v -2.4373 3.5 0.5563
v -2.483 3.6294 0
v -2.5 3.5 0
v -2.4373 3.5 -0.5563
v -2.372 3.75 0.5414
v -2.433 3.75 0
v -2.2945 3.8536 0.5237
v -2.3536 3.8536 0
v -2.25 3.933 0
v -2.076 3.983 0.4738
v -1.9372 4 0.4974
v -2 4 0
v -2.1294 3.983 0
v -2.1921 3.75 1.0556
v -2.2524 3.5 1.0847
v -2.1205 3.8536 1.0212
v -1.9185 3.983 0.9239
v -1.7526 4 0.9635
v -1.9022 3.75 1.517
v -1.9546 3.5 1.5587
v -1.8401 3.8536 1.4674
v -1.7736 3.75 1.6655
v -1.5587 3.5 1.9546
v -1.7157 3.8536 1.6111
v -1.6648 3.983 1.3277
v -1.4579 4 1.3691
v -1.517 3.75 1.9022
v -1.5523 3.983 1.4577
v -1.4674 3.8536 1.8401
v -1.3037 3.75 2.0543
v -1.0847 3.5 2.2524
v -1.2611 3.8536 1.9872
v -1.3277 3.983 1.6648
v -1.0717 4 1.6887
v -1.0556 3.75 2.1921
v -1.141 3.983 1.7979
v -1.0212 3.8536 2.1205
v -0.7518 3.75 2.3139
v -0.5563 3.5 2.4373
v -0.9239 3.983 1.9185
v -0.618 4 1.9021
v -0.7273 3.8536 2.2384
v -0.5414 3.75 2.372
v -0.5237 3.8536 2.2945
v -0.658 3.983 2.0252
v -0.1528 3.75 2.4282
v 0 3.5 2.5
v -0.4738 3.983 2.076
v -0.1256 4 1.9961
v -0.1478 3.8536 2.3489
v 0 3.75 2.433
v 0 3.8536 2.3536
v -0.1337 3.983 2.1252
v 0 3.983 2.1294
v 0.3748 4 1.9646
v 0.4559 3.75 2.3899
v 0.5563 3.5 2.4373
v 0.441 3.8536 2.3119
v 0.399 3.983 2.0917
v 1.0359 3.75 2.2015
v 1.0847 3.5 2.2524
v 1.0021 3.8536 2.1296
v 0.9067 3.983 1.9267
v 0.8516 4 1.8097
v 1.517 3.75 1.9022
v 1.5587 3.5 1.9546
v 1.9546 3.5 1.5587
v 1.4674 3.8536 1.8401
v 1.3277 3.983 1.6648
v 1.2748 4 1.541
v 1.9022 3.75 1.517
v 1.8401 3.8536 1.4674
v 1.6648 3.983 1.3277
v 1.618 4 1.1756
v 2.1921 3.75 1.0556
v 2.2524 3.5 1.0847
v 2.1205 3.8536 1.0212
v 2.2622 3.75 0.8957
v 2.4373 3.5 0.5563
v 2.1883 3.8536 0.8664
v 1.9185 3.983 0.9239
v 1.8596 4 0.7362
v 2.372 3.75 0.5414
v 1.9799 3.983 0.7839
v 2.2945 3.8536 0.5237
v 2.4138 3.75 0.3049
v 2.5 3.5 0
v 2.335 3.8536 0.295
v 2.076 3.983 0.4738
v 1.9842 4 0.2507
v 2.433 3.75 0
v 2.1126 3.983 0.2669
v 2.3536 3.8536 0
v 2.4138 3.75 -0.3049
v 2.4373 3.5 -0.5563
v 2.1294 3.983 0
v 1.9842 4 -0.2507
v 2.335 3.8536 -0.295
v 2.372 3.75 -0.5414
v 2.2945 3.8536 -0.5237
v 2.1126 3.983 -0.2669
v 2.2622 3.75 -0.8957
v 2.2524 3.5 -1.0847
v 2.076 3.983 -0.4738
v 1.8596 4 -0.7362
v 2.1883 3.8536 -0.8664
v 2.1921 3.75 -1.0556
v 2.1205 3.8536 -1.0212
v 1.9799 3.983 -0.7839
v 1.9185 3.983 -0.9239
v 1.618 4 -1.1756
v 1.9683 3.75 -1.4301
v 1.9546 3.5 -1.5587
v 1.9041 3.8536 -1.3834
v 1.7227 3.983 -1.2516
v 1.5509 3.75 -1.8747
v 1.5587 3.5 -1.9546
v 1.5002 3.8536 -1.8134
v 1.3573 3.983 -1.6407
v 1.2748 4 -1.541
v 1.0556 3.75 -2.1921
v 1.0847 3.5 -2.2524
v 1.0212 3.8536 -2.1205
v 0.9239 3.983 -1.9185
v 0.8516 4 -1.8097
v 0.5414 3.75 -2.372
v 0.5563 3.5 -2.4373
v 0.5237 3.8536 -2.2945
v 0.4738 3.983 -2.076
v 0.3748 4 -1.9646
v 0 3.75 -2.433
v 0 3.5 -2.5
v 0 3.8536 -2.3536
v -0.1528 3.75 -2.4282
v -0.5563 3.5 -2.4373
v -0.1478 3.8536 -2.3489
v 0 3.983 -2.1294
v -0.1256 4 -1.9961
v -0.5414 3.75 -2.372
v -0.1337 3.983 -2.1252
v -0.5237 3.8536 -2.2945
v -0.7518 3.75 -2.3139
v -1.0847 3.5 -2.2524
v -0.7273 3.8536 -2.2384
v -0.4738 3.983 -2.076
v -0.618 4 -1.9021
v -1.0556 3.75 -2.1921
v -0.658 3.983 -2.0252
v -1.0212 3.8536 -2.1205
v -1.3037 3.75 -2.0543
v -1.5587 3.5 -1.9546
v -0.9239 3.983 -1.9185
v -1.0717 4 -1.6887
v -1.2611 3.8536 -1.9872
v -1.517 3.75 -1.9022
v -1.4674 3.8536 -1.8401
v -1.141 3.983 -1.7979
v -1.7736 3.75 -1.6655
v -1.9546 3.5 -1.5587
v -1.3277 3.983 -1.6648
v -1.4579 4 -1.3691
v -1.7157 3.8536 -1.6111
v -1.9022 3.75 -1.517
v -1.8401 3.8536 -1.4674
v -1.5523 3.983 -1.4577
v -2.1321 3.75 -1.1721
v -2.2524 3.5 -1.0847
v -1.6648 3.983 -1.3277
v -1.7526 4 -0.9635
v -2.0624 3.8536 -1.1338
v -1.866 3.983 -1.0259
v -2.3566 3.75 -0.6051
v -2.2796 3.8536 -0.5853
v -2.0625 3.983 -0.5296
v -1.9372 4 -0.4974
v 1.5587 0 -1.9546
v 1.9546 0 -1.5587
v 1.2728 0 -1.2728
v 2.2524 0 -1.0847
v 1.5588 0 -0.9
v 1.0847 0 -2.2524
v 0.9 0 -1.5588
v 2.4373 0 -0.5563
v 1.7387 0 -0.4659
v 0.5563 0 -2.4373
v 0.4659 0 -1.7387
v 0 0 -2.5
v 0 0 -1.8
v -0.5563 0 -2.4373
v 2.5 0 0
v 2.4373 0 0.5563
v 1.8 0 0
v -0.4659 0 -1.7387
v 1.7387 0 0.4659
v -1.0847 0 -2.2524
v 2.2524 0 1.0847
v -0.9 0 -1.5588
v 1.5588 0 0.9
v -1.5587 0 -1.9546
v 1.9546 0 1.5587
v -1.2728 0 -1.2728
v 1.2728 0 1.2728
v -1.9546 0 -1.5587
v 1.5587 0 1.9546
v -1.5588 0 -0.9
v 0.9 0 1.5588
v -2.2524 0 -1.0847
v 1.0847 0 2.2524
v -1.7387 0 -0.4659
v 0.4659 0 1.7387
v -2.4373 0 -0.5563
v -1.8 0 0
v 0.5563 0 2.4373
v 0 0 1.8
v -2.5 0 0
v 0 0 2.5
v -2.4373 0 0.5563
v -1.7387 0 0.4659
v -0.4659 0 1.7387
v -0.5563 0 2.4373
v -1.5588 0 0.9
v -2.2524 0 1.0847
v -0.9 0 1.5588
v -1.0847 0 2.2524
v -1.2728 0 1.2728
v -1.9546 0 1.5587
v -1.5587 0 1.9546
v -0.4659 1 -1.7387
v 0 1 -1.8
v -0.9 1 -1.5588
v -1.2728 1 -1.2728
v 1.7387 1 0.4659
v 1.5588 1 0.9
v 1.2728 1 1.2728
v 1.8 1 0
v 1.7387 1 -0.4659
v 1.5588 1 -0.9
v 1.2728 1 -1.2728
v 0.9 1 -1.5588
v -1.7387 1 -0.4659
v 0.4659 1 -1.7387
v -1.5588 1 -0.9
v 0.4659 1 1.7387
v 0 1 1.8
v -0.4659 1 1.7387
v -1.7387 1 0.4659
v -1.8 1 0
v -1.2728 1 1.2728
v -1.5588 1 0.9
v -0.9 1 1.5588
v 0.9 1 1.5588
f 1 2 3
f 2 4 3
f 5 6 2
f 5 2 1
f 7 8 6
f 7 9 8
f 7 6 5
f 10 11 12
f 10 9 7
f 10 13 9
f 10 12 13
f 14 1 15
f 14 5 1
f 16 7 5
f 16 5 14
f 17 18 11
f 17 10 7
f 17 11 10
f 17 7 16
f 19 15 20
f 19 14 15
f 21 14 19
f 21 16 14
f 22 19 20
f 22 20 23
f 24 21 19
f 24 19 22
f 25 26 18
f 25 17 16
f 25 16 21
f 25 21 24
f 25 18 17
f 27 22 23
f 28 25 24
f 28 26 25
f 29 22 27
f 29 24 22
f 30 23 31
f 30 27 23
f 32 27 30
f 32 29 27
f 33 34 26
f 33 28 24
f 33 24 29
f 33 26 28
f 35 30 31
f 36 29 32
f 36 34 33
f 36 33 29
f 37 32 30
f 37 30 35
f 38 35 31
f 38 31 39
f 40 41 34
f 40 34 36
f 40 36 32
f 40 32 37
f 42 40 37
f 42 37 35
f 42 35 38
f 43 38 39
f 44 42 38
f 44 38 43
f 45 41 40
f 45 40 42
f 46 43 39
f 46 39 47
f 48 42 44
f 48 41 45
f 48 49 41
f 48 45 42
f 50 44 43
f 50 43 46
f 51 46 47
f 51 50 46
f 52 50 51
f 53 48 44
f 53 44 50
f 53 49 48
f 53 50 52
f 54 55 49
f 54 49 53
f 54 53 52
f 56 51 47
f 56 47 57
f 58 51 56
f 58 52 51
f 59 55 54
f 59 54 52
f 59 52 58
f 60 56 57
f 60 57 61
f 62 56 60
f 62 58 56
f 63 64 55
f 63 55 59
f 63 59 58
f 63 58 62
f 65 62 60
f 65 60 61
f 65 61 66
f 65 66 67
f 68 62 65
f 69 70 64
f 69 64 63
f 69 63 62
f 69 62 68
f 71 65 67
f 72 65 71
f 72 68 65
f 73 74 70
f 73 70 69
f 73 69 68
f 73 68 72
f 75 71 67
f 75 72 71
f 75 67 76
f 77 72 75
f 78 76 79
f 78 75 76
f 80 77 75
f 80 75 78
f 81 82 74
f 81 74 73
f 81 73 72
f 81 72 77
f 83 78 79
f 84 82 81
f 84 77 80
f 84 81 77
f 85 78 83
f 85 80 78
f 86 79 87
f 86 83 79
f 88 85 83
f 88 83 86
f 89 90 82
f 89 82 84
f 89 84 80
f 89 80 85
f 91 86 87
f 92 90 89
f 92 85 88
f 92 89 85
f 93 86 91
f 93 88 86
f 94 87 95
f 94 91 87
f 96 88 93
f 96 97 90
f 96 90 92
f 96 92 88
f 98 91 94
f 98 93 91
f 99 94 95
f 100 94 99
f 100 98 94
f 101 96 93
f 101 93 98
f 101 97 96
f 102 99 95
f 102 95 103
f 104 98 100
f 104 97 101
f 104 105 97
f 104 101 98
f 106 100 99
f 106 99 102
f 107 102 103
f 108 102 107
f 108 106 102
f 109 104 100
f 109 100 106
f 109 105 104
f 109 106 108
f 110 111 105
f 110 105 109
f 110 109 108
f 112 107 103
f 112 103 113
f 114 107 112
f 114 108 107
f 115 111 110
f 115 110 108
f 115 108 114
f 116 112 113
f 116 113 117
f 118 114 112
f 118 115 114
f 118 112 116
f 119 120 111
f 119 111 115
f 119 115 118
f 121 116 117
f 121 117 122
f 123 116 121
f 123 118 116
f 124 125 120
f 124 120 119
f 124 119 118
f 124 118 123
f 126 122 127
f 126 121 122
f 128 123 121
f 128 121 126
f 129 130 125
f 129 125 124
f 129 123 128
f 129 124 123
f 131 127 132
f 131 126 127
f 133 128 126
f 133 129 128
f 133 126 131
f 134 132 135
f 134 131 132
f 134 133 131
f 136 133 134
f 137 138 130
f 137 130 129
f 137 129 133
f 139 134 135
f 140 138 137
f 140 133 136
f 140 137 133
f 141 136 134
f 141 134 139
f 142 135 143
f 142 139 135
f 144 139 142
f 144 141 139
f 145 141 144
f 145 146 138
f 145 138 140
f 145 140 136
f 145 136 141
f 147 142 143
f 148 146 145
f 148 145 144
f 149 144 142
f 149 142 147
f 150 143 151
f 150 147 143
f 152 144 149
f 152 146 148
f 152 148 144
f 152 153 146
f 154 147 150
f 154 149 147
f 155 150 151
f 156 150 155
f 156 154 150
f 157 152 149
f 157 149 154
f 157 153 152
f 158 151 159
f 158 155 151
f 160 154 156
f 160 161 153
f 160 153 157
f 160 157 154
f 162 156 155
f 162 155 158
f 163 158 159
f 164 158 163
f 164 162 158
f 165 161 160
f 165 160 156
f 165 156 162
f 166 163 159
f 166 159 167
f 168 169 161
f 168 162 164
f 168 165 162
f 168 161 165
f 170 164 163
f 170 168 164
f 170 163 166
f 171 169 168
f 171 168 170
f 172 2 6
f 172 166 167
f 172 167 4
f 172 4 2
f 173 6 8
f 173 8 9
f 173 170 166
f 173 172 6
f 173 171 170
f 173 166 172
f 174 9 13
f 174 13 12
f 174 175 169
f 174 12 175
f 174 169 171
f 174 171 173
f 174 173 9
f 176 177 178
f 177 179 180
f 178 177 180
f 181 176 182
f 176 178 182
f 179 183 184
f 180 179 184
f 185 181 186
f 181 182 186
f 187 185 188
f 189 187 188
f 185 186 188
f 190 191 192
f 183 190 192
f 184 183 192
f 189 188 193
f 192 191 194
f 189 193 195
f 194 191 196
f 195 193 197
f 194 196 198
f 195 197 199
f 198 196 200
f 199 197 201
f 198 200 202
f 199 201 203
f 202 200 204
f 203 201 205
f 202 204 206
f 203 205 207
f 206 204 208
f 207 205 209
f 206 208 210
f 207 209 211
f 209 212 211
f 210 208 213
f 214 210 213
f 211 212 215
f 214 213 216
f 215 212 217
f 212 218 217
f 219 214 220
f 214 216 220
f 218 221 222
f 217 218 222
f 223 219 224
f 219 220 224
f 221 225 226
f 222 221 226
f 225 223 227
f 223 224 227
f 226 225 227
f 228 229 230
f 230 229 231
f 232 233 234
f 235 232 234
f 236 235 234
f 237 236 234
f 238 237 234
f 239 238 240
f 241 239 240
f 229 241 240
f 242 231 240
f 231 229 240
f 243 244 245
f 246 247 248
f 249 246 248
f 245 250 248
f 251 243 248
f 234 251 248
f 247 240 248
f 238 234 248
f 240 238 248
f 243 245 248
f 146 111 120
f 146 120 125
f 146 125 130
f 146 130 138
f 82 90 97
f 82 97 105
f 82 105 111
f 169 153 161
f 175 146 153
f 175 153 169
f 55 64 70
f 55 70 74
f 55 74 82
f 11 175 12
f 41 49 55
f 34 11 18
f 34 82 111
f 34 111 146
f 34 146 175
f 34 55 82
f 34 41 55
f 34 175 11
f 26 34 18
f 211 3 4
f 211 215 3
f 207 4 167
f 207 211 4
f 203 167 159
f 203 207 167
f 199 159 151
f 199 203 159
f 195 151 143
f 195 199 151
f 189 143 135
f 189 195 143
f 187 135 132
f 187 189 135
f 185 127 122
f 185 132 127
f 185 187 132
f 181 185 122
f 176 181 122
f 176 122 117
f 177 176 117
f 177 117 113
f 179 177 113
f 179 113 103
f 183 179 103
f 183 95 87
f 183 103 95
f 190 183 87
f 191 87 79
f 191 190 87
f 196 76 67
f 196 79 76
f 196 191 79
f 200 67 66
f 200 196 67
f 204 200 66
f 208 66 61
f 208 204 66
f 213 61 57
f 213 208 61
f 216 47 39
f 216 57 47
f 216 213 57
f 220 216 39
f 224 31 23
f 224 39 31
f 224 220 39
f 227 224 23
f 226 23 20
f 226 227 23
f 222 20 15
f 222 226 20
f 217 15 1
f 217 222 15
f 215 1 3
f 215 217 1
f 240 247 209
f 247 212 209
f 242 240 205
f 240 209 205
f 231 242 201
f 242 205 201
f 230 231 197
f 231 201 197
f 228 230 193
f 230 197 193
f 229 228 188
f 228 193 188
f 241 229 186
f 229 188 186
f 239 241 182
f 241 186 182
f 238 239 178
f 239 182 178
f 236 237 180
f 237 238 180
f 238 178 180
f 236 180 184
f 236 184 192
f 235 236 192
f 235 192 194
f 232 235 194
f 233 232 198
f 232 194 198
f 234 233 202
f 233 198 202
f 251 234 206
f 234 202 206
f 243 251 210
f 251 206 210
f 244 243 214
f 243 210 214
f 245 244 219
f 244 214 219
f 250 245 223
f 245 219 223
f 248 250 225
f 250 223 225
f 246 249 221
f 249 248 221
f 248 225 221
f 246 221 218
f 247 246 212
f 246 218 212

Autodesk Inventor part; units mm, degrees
ref_plane "YZ Plane" through (0, 0, 0) normal (1, 0, 0) x (0, 1, 0)
ref_plane "XZ Plane" through (0, 0, 0) normal (0, 1, 0) x (-1, 0, 0)
ref_plane "XY Plane" through (0, 0, 0) normal (0, 0, 1) x (1, 0, 0)
sketch "Sketch1" plane through (0, 0, 0) normal (0, 1, 0) x (-1, 0, 0)
  circle A0 centre (0, 0) radius 1.8
  circle A1 centre (0, 0) radius 2.5
  dimension "d1" = 3.6
  dimension "d7" = 5
extrude "Extrusion1" add sketch "Sketch1" along normal blind 4 contours A0 | A1
extrude "Extrusion2" cut sketch "Sketch1" along normal blind 1 contours A0
fillet "Fillet1" radius 0.5 1 edges at (2.5, 4, 0)
properties part number "button"
